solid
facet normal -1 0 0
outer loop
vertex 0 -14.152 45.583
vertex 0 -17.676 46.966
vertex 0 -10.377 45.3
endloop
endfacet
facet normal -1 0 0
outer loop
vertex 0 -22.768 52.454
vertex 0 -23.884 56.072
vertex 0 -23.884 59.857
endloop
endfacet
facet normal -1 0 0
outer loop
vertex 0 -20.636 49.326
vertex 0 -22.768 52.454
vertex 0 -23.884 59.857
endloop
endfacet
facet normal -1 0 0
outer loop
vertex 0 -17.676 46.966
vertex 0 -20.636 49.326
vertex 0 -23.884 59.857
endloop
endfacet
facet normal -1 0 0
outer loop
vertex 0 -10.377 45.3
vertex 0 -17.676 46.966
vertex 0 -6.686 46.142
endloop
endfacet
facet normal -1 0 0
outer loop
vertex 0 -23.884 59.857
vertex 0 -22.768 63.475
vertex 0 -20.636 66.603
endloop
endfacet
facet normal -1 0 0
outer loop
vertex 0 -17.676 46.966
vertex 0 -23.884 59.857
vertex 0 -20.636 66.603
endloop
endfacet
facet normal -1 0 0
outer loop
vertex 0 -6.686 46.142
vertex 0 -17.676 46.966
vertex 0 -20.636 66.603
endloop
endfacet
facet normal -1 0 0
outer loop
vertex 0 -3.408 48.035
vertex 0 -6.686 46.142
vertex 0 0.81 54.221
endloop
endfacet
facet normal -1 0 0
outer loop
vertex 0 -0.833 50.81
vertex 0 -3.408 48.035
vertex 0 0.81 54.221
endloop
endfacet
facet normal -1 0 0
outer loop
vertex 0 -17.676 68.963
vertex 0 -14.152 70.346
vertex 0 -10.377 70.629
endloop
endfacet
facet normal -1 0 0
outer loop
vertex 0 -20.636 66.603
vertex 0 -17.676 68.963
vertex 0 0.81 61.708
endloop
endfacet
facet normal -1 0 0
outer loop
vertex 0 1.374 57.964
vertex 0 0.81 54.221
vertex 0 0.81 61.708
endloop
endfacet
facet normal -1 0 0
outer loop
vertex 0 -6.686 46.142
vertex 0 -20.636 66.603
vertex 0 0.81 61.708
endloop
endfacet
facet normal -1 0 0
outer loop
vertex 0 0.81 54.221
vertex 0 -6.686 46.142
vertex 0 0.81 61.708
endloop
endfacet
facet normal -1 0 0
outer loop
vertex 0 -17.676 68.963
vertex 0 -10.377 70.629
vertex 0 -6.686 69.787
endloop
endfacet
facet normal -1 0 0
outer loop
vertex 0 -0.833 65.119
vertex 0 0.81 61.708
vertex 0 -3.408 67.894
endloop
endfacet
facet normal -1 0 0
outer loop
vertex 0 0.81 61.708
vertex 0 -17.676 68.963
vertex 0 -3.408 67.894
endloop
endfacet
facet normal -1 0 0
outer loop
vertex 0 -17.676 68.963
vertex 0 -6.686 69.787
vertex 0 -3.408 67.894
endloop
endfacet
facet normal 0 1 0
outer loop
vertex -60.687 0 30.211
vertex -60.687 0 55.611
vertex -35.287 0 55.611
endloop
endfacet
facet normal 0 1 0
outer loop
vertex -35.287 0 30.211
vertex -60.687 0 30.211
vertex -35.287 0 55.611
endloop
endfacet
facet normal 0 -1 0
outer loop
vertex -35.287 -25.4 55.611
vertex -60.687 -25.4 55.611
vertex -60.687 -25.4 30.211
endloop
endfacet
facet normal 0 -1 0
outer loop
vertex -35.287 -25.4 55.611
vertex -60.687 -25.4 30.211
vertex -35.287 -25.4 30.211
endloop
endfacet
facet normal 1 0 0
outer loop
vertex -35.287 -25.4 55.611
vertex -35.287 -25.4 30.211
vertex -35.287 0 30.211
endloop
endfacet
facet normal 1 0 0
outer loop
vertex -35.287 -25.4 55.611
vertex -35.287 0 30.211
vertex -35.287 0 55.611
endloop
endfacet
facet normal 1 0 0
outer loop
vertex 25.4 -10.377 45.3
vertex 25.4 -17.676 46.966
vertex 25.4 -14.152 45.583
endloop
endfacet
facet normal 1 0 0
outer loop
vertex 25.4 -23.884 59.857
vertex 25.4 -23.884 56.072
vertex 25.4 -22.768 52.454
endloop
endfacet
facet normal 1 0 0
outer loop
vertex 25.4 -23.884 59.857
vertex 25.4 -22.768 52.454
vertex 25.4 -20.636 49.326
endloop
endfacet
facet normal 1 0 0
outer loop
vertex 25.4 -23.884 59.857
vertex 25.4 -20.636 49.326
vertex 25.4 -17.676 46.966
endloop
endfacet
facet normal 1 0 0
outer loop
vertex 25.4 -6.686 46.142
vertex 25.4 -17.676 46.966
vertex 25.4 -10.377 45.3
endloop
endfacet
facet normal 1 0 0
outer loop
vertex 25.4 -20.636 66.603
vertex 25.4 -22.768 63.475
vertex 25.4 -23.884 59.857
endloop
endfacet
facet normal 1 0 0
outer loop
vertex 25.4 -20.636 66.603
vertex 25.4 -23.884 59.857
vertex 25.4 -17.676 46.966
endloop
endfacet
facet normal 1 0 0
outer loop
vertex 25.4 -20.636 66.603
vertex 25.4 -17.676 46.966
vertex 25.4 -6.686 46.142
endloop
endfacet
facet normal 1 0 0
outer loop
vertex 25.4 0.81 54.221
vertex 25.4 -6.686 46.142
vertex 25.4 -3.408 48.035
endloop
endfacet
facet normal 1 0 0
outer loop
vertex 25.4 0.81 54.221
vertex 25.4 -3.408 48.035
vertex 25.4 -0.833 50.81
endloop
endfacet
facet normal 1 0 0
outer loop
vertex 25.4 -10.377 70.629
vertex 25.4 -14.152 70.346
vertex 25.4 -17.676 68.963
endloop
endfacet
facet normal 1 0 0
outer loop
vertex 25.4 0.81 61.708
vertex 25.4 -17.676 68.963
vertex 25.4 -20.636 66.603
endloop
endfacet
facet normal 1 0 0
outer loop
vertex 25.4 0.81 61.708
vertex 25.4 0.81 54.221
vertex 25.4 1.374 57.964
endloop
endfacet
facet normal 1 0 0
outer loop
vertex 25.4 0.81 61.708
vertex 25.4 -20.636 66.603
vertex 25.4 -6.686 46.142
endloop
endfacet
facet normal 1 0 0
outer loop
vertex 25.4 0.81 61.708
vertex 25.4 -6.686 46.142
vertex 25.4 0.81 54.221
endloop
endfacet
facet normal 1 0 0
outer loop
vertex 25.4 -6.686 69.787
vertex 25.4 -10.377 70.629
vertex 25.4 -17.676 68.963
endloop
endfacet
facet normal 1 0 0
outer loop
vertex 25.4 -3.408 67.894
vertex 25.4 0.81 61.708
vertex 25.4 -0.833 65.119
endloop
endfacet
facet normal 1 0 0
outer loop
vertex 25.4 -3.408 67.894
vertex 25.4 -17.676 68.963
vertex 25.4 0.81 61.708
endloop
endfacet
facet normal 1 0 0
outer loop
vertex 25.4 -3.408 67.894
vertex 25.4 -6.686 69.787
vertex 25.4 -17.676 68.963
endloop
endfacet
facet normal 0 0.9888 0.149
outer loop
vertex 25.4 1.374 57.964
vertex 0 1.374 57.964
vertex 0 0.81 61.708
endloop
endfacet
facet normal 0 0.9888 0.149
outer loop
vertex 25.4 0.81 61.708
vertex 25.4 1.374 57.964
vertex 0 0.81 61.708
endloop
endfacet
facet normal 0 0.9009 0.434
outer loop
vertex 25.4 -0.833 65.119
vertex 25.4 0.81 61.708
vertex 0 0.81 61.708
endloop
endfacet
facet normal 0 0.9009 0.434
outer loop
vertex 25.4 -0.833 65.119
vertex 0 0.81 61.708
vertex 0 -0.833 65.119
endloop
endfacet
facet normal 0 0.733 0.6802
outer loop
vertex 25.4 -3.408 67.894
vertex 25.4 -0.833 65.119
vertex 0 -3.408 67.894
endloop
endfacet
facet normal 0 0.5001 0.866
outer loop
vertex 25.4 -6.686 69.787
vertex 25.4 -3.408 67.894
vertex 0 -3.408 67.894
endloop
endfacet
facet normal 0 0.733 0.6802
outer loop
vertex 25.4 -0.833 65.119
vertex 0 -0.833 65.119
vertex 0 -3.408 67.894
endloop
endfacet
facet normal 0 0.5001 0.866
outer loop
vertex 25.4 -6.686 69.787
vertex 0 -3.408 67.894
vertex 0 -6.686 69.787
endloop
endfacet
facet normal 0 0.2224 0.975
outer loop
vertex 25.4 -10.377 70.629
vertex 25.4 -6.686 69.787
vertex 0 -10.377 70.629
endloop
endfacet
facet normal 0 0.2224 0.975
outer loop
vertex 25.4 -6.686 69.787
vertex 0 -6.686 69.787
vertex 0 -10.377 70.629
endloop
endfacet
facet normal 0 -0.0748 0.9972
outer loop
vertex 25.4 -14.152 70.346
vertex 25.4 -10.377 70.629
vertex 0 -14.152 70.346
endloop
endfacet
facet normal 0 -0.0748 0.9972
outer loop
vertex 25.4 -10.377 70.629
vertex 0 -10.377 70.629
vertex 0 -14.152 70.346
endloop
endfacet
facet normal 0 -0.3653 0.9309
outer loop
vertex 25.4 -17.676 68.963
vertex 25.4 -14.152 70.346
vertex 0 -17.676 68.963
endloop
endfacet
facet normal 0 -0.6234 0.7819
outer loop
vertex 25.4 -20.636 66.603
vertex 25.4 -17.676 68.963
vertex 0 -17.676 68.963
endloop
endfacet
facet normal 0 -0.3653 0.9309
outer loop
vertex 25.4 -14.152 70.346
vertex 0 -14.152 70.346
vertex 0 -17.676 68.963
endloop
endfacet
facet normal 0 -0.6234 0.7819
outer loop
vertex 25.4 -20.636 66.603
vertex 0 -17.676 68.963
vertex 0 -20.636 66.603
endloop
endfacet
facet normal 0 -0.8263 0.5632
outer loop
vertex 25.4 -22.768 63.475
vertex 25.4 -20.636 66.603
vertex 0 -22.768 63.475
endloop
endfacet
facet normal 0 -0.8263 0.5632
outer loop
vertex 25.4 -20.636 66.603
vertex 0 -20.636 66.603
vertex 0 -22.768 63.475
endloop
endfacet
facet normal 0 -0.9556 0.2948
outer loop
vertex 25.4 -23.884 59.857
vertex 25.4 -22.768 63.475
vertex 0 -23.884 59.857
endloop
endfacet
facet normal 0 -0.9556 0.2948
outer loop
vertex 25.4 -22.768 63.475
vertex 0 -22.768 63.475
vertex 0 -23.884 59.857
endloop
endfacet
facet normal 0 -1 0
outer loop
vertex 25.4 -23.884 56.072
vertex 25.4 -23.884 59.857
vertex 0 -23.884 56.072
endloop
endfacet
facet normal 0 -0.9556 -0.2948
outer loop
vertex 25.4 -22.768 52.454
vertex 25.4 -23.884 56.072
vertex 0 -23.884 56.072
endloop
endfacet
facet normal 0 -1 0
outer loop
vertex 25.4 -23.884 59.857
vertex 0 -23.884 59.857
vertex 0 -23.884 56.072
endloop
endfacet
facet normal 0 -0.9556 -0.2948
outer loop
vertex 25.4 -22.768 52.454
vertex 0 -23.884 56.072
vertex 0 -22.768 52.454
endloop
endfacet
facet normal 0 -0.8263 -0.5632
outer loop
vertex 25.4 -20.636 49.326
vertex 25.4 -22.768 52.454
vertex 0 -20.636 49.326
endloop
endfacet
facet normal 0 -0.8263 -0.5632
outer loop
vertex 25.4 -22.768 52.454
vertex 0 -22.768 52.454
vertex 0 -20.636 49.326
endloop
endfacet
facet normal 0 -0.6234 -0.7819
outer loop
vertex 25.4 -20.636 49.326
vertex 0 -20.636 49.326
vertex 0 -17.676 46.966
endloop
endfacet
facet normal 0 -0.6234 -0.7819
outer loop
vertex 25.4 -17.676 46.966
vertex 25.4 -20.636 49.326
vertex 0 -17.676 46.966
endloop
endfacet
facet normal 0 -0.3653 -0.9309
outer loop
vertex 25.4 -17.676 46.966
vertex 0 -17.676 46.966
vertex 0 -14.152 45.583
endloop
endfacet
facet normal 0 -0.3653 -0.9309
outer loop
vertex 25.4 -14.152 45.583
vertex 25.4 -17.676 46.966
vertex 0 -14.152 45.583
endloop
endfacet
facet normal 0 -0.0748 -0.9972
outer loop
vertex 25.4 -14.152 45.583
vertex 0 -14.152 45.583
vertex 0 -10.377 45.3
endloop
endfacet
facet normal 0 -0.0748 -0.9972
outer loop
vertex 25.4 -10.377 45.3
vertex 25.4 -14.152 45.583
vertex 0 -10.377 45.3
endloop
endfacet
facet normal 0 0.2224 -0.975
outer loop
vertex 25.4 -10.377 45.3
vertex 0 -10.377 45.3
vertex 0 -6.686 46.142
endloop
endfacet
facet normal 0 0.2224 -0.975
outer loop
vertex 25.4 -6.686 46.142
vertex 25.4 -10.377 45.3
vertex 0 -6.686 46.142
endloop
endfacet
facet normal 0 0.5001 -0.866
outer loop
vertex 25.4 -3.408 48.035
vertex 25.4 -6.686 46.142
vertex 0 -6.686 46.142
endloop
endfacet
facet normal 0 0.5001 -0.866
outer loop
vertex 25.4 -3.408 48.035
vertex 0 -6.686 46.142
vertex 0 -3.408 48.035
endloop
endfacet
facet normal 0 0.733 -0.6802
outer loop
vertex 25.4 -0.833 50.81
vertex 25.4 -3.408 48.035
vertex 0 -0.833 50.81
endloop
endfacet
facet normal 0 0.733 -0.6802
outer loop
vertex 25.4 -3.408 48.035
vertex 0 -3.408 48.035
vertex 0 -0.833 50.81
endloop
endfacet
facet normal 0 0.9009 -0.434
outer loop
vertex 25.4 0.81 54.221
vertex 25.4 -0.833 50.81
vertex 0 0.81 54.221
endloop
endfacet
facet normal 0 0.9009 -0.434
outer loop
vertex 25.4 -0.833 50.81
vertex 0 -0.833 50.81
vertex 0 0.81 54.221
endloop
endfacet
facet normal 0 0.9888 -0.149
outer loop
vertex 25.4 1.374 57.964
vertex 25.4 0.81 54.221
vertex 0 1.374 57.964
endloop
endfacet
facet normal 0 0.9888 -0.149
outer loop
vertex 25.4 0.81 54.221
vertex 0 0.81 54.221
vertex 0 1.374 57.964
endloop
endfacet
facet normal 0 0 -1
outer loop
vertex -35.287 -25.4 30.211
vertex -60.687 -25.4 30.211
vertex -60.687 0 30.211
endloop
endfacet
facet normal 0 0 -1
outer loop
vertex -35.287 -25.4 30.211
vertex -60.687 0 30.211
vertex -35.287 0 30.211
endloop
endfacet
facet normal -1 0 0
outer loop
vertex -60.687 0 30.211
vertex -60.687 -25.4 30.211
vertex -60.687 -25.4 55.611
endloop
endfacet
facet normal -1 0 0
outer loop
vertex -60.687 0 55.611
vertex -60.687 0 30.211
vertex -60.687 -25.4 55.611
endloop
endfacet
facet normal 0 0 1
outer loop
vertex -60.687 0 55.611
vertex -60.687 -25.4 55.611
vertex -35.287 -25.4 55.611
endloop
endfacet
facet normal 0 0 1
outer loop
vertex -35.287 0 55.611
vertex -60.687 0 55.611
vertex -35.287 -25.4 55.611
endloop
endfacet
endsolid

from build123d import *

# Parameters (mm, degrees)
F0_W     = 25.4
F0_H     = 25.4
F1_DEPTH = 25.4
F2_R     = 12.7
F3_DEPTH = 25.4


with BuildPart() as f1:
    # F0 (on Front) → F1 (new body)
    with BuildSketch(Plane.XZ):
        with Locations((-47.986574, 42.910739)):
            Rectangle(F0_W, F0_H)
    extrude(amount=F1_DEPTH)


with BuildPart() as f3:
    # F2 (on Right) → F3 (new body)
    with BuildSketch(Plane.YZ):
        with Locations((-11.326102, 57.96444)):
            Circle(F2_R)
    extrude(amount=F3_DEPTH)


solid = Compound([f1.part, f3.part])
